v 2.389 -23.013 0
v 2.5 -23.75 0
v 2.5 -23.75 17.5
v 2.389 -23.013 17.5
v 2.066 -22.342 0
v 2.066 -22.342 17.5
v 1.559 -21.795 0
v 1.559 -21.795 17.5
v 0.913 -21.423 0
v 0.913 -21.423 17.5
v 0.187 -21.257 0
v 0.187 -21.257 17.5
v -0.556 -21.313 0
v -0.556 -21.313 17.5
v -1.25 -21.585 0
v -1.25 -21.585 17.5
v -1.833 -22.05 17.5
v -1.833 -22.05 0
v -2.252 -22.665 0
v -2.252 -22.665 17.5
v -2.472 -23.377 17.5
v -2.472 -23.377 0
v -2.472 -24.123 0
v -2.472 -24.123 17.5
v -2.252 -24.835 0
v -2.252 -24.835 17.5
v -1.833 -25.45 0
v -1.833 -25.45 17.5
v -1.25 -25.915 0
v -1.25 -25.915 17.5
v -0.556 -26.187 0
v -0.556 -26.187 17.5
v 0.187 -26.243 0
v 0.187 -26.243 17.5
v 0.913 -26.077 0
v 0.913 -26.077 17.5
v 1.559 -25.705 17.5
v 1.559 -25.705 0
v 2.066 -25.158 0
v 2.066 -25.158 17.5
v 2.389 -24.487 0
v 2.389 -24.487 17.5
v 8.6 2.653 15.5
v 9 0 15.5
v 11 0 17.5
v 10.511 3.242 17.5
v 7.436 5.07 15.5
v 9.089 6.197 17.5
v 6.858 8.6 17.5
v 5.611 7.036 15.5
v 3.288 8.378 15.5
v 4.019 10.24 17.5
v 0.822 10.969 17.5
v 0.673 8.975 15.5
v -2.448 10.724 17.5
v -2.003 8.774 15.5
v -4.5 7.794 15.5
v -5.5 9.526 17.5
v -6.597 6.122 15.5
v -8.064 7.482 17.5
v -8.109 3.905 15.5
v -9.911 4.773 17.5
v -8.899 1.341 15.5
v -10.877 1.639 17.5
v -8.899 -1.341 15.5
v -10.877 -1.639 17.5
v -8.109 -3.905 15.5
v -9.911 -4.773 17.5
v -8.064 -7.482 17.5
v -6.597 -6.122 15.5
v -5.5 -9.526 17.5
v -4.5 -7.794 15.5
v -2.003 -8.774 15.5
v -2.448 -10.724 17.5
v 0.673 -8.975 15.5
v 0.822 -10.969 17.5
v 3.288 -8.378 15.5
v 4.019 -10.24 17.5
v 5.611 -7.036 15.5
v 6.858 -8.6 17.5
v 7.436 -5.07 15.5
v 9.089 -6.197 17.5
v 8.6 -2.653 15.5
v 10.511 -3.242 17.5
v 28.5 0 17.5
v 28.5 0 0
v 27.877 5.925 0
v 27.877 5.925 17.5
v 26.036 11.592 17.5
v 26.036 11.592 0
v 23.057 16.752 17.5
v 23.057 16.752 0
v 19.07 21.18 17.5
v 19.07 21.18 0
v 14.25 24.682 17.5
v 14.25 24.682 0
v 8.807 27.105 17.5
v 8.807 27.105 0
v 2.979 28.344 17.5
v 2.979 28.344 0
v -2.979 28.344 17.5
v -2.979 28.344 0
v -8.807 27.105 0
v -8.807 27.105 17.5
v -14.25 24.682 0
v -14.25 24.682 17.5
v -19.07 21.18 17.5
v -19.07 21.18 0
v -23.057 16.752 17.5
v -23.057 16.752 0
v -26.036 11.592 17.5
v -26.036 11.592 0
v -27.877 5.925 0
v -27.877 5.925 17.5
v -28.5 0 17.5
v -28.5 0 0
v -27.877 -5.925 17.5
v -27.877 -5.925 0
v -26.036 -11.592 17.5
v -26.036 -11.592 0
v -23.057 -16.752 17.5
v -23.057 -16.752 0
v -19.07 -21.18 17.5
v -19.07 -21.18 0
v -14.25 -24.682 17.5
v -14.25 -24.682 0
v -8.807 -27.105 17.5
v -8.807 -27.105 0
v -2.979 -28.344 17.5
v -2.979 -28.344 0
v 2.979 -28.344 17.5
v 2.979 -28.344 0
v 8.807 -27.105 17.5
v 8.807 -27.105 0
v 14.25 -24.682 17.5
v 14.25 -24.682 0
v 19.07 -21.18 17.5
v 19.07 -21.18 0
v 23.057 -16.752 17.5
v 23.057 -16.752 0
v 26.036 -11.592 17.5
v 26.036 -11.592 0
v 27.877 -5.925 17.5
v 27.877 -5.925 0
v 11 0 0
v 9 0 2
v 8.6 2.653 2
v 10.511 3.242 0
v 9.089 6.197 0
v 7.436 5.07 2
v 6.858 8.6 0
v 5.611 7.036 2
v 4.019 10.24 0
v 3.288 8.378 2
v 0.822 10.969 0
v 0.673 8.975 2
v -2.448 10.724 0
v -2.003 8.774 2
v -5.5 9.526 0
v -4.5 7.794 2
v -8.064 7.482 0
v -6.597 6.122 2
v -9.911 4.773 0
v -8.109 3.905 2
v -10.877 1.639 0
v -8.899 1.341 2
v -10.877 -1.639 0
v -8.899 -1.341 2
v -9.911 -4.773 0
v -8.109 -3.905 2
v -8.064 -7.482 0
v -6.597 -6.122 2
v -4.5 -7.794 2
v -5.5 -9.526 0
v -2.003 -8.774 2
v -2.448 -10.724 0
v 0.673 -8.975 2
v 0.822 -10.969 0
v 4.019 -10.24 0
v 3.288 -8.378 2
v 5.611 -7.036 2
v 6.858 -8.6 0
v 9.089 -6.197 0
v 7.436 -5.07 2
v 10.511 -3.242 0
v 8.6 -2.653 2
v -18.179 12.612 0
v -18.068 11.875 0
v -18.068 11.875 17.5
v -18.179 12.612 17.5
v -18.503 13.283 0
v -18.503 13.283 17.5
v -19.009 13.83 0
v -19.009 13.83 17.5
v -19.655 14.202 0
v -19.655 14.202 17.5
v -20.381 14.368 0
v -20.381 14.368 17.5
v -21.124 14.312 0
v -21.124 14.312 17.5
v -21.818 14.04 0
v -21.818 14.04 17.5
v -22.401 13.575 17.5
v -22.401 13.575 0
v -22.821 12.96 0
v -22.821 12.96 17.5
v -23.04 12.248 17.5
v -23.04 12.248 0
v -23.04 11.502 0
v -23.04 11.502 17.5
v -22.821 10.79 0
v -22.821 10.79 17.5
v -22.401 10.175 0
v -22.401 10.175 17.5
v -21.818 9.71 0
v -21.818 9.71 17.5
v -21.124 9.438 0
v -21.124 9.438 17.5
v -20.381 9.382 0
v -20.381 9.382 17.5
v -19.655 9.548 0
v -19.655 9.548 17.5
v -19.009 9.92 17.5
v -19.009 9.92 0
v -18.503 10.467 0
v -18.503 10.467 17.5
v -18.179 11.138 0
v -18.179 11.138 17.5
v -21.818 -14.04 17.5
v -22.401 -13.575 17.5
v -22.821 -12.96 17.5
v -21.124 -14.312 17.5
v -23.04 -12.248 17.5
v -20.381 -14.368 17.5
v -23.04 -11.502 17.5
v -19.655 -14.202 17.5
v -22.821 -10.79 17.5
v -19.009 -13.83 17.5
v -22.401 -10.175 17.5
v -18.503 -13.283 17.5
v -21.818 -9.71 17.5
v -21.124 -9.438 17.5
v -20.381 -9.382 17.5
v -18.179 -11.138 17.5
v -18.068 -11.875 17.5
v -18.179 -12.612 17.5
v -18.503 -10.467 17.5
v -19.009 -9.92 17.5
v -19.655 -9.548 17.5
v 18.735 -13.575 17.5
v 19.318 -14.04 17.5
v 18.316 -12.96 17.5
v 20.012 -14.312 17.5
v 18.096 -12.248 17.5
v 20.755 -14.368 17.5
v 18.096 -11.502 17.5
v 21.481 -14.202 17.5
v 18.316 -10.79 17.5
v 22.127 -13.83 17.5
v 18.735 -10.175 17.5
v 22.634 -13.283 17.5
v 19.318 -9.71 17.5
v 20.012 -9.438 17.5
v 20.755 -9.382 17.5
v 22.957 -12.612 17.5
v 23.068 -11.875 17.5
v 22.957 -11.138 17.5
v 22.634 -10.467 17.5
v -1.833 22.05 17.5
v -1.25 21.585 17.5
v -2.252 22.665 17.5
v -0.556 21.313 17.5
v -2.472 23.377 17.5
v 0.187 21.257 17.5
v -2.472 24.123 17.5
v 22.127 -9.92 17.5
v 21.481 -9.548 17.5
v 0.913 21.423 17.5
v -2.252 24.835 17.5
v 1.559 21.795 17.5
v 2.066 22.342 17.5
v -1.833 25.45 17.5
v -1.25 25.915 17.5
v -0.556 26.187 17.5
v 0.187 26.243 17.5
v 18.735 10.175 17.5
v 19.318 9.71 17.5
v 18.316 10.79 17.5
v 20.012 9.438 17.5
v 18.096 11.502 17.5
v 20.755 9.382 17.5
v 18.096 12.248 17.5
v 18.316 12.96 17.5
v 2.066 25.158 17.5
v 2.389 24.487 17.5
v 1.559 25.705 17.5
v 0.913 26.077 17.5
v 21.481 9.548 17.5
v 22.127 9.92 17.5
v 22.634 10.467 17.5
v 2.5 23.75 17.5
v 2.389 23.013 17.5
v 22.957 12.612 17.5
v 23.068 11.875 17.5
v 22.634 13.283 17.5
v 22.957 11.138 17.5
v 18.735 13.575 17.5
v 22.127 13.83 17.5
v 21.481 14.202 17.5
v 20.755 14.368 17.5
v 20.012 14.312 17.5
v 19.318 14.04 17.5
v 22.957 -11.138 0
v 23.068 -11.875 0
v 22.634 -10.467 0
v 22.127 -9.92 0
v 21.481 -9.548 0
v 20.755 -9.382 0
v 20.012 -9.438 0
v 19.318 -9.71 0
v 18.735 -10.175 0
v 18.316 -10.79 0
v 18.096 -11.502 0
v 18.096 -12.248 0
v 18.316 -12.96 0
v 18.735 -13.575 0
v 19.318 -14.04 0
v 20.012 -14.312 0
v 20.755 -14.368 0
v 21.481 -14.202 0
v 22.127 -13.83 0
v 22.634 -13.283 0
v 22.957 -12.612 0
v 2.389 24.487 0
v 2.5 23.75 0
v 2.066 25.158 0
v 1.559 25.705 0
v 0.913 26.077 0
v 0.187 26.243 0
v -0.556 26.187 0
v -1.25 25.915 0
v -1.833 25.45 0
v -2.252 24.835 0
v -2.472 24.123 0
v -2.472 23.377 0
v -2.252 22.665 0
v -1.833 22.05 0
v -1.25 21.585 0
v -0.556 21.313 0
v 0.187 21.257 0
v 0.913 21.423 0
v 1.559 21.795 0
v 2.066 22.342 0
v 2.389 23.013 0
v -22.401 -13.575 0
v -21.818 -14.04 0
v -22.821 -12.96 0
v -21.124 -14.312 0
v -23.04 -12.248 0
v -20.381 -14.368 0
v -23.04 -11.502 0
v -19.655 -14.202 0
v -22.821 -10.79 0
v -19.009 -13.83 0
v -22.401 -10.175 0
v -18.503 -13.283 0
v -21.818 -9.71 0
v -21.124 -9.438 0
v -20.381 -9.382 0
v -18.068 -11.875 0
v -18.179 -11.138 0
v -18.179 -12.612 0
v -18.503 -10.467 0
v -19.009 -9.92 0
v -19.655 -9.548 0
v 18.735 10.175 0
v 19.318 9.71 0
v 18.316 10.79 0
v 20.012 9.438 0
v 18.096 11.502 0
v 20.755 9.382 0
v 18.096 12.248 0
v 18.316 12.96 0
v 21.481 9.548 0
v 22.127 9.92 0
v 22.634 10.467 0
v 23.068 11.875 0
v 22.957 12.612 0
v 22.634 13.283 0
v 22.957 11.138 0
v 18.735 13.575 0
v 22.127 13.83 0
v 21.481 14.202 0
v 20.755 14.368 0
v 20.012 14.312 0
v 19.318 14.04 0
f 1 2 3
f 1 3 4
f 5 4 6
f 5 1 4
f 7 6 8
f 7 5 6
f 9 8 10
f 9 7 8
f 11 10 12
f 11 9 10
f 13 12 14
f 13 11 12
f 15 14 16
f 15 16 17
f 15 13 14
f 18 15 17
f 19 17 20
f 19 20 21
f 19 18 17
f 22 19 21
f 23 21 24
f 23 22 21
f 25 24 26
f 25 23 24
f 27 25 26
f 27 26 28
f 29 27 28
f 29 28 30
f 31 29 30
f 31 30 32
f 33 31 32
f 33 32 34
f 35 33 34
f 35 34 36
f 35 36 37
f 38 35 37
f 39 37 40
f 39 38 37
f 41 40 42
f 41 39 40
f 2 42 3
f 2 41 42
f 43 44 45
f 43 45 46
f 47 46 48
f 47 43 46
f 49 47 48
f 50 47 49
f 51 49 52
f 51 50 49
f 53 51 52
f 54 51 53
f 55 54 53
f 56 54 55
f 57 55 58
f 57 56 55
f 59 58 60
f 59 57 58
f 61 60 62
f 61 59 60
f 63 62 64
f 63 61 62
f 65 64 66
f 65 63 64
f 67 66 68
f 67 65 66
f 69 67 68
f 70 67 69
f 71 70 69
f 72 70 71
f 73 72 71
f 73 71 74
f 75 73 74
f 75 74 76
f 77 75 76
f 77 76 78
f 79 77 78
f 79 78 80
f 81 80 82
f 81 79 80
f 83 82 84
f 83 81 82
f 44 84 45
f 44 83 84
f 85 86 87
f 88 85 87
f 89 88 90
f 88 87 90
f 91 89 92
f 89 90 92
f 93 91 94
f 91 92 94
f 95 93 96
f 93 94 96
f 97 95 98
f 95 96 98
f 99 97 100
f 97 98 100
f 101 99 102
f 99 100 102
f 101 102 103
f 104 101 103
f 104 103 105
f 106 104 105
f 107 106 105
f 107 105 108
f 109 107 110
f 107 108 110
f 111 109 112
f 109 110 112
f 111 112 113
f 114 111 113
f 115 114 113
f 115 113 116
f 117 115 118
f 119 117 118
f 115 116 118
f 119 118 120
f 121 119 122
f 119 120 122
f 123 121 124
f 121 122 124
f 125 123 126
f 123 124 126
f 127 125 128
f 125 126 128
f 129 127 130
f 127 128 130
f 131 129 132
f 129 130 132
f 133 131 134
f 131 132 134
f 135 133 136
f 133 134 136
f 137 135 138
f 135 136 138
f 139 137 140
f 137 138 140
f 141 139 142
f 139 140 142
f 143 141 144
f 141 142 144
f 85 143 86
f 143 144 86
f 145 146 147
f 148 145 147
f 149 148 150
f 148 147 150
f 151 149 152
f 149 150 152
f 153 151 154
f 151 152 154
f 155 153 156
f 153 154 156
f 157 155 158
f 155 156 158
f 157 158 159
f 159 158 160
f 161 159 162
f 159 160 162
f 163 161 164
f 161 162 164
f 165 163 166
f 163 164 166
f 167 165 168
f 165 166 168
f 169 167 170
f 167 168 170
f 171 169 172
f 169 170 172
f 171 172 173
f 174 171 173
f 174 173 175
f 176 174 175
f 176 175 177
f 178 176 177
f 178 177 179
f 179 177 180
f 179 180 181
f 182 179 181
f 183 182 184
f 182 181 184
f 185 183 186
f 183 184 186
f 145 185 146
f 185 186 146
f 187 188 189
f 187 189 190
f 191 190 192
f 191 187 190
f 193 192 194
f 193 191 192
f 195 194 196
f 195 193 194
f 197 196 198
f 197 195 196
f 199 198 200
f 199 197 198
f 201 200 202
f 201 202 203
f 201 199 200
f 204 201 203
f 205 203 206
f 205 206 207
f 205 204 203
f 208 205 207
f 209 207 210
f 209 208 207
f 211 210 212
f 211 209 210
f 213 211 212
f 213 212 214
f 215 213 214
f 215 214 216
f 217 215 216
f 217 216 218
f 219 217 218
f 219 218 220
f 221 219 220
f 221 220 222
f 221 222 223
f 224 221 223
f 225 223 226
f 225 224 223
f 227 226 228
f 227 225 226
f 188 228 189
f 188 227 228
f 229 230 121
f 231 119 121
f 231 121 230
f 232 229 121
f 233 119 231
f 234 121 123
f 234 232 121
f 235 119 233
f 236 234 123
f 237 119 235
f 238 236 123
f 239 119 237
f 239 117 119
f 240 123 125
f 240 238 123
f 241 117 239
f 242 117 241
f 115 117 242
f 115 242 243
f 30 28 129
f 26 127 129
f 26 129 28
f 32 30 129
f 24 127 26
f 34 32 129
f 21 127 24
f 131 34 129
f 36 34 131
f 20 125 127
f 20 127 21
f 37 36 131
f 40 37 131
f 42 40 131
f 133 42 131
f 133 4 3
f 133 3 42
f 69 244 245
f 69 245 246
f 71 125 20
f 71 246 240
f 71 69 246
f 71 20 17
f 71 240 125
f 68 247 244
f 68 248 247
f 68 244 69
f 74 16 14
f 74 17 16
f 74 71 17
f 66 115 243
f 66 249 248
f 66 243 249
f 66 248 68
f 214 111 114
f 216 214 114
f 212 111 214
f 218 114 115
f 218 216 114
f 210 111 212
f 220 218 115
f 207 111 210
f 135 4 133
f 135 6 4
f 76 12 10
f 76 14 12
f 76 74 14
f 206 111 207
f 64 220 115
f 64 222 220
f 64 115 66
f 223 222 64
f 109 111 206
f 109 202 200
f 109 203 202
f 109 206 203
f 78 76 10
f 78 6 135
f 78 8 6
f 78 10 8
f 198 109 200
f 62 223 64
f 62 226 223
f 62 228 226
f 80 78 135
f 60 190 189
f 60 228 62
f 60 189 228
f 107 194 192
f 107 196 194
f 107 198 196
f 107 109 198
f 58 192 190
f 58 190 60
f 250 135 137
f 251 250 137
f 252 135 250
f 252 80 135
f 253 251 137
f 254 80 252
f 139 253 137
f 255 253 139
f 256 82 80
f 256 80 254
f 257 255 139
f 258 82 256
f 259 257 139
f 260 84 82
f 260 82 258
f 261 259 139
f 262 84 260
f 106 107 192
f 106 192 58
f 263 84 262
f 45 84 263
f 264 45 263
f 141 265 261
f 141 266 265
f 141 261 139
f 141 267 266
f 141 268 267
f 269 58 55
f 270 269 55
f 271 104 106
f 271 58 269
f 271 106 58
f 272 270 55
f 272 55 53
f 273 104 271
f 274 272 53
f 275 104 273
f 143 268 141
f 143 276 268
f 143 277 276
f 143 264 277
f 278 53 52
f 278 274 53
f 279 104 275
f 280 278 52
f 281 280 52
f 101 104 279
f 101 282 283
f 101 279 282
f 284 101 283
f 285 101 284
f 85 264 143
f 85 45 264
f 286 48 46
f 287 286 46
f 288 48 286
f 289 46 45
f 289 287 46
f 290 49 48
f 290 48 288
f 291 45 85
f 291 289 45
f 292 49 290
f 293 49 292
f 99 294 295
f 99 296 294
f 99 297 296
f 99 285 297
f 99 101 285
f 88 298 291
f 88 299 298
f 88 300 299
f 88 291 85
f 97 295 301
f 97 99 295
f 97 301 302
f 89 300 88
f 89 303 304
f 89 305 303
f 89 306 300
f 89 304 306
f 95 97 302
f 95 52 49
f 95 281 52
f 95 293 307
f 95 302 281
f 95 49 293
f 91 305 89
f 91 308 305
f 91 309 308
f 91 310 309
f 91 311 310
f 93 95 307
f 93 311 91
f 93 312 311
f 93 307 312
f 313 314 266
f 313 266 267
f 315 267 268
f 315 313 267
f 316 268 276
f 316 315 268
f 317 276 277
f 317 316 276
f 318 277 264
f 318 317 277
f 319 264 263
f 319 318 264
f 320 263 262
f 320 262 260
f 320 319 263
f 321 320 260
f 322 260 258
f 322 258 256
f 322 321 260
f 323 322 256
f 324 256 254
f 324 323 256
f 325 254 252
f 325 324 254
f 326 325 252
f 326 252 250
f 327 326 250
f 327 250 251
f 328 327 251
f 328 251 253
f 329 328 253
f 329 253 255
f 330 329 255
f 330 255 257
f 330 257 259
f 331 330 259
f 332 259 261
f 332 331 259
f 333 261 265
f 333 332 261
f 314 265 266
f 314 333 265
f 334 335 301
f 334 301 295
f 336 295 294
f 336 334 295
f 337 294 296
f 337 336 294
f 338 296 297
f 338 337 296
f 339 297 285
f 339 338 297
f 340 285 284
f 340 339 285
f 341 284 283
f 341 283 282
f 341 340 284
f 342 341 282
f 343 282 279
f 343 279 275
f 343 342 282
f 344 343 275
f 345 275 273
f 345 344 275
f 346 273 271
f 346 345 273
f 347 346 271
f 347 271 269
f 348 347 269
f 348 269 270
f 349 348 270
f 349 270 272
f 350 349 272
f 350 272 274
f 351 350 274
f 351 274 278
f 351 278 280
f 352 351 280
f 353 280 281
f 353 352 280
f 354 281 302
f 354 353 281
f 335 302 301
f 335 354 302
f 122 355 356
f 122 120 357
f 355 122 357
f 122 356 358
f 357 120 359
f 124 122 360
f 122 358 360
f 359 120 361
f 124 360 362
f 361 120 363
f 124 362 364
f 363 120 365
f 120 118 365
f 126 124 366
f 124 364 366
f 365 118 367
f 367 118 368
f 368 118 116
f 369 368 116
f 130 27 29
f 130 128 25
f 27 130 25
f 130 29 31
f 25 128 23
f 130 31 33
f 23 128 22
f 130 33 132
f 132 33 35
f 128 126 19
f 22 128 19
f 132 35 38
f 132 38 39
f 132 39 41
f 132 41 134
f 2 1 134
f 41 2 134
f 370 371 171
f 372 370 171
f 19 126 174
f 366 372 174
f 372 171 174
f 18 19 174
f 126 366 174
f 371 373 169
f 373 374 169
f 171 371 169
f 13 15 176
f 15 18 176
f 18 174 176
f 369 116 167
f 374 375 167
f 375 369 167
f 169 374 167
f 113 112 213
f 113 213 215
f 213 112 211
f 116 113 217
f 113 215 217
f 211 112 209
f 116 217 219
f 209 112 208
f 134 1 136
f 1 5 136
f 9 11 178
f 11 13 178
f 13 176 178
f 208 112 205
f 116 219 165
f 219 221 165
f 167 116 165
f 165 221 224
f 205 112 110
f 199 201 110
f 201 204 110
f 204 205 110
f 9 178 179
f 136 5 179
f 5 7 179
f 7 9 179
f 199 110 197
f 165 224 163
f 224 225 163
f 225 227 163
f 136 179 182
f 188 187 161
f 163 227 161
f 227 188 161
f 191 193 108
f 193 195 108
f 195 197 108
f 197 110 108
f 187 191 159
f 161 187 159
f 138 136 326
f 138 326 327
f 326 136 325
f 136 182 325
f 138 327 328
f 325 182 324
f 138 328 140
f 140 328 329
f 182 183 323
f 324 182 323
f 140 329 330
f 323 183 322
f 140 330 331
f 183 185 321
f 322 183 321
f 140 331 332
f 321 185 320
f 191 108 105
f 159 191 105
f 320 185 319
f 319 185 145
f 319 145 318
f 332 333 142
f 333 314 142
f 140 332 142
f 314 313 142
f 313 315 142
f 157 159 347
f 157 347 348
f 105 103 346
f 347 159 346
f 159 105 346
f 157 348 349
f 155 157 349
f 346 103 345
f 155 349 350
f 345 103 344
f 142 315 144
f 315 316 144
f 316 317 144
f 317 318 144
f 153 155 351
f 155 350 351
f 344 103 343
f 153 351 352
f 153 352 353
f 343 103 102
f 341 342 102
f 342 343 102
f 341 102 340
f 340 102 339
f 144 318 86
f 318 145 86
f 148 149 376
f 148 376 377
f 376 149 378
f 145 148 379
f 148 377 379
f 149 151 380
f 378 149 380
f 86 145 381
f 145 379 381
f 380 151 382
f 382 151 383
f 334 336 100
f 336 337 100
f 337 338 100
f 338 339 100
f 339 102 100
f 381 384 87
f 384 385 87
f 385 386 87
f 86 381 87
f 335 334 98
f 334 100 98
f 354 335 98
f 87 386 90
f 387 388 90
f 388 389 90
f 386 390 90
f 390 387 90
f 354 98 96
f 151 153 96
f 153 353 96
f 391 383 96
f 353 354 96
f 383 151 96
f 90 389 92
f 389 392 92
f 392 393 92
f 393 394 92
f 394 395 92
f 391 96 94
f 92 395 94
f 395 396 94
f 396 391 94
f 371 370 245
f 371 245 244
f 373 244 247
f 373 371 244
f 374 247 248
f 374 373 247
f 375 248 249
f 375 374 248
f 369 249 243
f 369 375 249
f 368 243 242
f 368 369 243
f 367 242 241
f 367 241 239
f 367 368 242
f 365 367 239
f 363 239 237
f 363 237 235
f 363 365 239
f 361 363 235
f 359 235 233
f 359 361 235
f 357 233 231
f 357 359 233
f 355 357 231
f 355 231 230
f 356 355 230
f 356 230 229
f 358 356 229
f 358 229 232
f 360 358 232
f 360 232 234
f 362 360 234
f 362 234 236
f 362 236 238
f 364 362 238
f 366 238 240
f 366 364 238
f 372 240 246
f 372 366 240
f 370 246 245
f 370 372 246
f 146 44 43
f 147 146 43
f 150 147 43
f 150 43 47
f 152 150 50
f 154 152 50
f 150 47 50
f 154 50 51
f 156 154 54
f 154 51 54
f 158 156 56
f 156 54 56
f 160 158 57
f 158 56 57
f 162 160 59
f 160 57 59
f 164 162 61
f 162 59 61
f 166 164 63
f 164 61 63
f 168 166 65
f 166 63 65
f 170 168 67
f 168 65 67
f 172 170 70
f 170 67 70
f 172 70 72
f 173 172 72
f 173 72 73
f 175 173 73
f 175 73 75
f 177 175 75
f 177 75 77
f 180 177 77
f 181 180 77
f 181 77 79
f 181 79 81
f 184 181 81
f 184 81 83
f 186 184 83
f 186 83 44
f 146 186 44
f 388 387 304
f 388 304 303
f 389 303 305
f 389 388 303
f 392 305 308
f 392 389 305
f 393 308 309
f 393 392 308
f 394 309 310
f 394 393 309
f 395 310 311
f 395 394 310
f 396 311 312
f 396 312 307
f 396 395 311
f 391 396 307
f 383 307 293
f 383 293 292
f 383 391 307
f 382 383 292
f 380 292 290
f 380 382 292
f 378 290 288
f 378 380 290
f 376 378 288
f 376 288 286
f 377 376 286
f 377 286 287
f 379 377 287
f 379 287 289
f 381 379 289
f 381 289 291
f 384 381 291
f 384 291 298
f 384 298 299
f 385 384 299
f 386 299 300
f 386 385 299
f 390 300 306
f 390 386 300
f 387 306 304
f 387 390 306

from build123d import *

# Parameters (mm, degrees)
SKETCH1_R           = 28.5
SKETCH1_R_2         = 2.5
BOSS_EXTRUDE1_DEPTH = 17.5
SKETCH2_R           = 9
CUT_EXTRUDE1_DEPTH  = 18.5
CHAMFER1_SIZE       = 2


with BuildPart() as part:
    # Sketch1 → Boss-Extrude1 (new body)
    with BuildSketch(Plane.XY):
        Circle(SKETCH1_R)
        with Locations((0, 23.75)):
            Circle(SKETCH1_R_2, mode=Mode.SUBTRACT)
        with Locations((20.56810334, 11.875)):
            Circle(SKETCH1_R_2, mode=Mode.SUBTRACT)
        with Locations((20.56810334, -11.875)):
            Circle(SKETCH1_R_2, mode=Mode.SUBTRACT)
        with Locations((0, -23.75)):
            Circle(SKETCH1_R_2, mode=Mode.SUBTRACT)
        with Locations((-20.56810334, -11.875)):
            Circle(SKETCH1_R_2, mode=Mode.SUBTRACT)
        with Locations((-20.56810334, 11.875)):
            Circle(SKETCH1_R_2, mode=Mode.SUBTRACT)
    extrude(amount=BOSS_EXTRUDE1_DEPTH)

    # Sketch2 → Cut-Extrude1 (cut, through all)
    with BuildSketch(Plane.XY.offset(17.5)):
        Circle(SKETCH2_R)
    extrude(amount=-CUT_EXTRUDE1_DEPTH, mode=Mode.SUBTRACT)

    # Chamfer1
    chamfer1_edges = [part.edges().sort_by_distance(p)[0] for p in [
        (-9, 0, 0),
        (-9, 0, 17.5),
    ]]
    chamfer(chamfer1_edges, length=CHAMFER1_SIZE)


solid = part.part
